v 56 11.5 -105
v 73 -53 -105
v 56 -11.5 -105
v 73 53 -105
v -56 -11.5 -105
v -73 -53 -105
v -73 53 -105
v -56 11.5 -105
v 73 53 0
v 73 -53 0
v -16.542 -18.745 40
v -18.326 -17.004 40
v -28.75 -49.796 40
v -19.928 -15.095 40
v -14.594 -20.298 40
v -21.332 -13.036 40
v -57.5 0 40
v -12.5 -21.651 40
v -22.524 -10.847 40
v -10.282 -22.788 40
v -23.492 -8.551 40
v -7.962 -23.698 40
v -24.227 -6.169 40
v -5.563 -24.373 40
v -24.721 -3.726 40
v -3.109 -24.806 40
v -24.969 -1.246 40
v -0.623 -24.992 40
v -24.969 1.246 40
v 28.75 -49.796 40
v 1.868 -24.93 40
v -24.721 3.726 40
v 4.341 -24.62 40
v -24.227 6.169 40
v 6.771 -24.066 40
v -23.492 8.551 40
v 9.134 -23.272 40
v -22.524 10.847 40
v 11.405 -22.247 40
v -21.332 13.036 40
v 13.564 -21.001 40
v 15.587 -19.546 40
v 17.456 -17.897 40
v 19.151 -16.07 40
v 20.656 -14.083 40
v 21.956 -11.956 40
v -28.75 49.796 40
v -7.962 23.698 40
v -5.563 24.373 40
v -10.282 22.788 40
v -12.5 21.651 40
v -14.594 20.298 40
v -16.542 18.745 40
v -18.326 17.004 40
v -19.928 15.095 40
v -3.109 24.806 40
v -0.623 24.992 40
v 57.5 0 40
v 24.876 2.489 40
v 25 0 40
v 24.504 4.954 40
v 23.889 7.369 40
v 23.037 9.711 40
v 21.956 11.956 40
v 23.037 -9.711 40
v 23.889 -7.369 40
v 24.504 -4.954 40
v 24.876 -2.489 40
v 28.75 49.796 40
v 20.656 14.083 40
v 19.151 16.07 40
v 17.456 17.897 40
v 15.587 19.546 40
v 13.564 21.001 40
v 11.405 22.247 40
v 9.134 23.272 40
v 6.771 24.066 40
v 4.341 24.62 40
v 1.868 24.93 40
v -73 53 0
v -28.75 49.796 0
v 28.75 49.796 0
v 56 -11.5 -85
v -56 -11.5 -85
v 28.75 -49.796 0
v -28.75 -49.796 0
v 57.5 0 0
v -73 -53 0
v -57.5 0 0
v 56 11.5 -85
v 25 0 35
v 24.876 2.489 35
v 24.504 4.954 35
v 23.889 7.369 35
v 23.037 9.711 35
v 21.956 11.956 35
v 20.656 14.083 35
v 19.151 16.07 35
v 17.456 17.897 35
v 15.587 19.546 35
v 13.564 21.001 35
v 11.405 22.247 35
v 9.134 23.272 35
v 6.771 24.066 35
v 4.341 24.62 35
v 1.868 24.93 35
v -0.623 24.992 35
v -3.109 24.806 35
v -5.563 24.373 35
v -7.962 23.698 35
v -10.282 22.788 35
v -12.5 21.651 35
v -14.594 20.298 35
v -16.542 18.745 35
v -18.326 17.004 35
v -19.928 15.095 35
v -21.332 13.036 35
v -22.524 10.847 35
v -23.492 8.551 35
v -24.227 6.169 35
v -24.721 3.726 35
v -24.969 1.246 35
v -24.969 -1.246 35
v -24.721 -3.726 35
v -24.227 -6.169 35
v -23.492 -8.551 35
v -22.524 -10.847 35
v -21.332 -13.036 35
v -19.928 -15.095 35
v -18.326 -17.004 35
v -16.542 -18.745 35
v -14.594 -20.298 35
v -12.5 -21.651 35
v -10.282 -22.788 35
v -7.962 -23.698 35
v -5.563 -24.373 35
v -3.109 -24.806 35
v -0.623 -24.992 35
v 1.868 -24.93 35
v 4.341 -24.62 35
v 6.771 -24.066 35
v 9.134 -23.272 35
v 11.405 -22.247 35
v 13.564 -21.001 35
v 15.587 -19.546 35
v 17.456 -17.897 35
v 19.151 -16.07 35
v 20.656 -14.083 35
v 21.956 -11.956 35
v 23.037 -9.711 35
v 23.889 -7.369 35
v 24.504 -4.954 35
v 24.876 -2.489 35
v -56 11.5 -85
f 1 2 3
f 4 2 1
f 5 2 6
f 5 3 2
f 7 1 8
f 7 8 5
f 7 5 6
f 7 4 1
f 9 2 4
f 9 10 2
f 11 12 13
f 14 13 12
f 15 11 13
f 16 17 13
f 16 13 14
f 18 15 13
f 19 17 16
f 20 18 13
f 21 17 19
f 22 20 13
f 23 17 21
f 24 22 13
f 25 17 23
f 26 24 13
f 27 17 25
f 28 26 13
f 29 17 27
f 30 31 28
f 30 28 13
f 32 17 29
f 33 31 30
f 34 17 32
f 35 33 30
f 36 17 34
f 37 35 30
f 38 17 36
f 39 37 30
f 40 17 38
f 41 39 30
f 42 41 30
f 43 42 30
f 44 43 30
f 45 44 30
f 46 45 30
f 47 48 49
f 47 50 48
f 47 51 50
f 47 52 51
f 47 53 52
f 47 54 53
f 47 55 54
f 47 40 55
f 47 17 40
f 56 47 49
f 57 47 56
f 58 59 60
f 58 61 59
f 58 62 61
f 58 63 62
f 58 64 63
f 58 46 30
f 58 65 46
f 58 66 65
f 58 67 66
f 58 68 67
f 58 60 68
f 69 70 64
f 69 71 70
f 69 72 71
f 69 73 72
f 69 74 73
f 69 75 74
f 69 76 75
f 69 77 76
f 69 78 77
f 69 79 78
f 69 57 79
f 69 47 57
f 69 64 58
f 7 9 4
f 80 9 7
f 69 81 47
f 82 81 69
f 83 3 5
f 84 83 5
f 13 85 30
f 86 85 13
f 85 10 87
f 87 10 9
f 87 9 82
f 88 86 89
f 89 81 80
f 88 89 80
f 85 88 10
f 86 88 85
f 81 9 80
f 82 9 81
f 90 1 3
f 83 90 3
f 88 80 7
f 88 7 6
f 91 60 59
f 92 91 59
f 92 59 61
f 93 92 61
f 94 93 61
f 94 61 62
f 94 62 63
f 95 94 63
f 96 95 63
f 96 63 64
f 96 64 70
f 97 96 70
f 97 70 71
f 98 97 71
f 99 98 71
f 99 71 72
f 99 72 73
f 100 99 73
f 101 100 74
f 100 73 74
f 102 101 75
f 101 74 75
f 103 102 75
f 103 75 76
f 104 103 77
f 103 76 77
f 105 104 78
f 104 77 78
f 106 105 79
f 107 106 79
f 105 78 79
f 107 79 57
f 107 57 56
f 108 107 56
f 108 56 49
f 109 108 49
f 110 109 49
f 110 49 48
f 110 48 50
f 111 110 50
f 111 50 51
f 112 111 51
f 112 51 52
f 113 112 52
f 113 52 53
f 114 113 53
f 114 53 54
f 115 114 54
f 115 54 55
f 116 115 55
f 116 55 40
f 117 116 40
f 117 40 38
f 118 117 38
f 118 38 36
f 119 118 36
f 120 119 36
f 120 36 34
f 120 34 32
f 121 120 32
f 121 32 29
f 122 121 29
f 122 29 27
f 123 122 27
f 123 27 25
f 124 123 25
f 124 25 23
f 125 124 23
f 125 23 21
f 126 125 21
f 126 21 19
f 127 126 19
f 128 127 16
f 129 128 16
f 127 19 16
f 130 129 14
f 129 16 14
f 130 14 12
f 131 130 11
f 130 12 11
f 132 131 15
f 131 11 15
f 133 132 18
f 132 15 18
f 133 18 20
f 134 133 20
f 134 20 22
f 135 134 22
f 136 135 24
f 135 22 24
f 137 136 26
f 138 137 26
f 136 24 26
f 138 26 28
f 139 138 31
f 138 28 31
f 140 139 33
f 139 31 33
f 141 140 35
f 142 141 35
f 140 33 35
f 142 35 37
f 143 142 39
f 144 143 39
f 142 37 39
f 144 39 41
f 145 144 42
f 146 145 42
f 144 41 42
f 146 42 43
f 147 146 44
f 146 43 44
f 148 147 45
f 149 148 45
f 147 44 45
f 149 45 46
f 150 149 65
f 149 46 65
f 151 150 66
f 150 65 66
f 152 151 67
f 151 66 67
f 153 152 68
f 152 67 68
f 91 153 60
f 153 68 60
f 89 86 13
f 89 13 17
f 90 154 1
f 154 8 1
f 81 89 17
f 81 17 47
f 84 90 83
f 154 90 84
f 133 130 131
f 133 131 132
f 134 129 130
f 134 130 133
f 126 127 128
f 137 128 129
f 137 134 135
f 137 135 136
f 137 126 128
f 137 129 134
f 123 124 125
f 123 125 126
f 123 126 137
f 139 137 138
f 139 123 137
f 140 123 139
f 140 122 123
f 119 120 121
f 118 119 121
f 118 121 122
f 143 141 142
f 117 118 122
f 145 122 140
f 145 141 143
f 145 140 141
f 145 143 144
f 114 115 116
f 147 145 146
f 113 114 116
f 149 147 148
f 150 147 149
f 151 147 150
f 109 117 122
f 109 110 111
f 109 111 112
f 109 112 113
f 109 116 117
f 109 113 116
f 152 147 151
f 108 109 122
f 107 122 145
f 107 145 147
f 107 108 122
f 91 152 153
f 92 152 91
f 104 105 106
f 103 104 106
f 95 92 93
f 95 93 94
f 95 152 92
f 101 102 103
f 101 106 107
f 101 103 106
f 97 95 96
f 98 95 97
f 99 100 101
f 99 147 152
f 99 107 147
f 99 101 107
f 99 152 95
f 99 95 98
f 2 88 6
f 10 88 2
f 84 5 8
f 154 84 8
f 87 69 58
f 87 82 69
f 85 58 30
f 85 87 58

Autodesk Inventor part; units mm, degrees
ref_plane "YZ Plane" through (0, 0, 0) normal (1, 0, 0) x (0, 1, 0)
ref_plane "XZ Plane" through (0, 0, 0) normal (0, 1, 0) x (-1, 0, 0)
ref_plane "XY Plane" through (0, 0, 0) normal (0, 0, 1) x (1, 0, 0)
sketch "Sketch1" plane through (0, 0, 0) normal (0, 0, 1) x (1, 0, 0)
  line L0 (57.5, 0) -> (28.75, -49.7965)
  line L1 (28.75, -49.7965) -> (-28.75, -49.7965)
  line L2 (-28.75, -49.7965) -> (-57.5, 0)
  line L3 (-57.5, 0) -> (-28.75, 49.7965)
  line L4 (-28.75, 49.7965) -> (28.75, 49.7965)
  line L5 (28.75, 49.7965) -> (57.5, 0)
  point P0 (0, 0)
  point P1 (0, 0)
  dimension "d0" = 115
extrude "Extrusion1" add sketch "Sketch1" along normal blind 40
sketch "Sketch2" plane through (0, 0, 0) normal (0, 0, -1) x (-1, 0, 0)
  line L0 (-73, 53) -> (73, 53)
  line L1 (73, 53) -> (73, -53)
  line L2 (73, -53) -> (-73, -53)
  line L3 (-73, -53) -> (-73, 53)
  point P0 (0, 0)
  point P1 (0, 53)
  point P2 (-73, 0)
  dimension "d3" = 146
  dimension "d4" = 106
extrude "Extrusion2" add sketch "Sketch2" along normal blind 105
sketch "Sketch3" plane through (0, 0, 40) normal (0, 0, 1) x (1, 0, 0)
  circle A0 centre (0, 0) radius 25
  dimension "d7" = 50
extrude "Extrusion3" cut sketch "Sketch3" against normal blind 5
sketch "Sketch4" plane through (0, 0, -105) normal (0, 0, -1) x (-1, 0, 0)
  line L0 (56, 11.5) -> (-56, 11.5)
  line L1 (-56, 11.5) -> (-56, -11.5)
  line L2 (-56, -11.5) -> (56, -11.5)
  line L3 (56, -11.5) -> (56, 11.5)
  point P0 (0, 0)
  point P1 (56, 0)
  point P2 (0, 11.5)
  dimension "d10" = 23
  dimension "d11" = 112
extrude "Extrusion4" cut sketch "Sketch4" against normal blind 20
properties part number "link_g0" material "ABS Plastic"
